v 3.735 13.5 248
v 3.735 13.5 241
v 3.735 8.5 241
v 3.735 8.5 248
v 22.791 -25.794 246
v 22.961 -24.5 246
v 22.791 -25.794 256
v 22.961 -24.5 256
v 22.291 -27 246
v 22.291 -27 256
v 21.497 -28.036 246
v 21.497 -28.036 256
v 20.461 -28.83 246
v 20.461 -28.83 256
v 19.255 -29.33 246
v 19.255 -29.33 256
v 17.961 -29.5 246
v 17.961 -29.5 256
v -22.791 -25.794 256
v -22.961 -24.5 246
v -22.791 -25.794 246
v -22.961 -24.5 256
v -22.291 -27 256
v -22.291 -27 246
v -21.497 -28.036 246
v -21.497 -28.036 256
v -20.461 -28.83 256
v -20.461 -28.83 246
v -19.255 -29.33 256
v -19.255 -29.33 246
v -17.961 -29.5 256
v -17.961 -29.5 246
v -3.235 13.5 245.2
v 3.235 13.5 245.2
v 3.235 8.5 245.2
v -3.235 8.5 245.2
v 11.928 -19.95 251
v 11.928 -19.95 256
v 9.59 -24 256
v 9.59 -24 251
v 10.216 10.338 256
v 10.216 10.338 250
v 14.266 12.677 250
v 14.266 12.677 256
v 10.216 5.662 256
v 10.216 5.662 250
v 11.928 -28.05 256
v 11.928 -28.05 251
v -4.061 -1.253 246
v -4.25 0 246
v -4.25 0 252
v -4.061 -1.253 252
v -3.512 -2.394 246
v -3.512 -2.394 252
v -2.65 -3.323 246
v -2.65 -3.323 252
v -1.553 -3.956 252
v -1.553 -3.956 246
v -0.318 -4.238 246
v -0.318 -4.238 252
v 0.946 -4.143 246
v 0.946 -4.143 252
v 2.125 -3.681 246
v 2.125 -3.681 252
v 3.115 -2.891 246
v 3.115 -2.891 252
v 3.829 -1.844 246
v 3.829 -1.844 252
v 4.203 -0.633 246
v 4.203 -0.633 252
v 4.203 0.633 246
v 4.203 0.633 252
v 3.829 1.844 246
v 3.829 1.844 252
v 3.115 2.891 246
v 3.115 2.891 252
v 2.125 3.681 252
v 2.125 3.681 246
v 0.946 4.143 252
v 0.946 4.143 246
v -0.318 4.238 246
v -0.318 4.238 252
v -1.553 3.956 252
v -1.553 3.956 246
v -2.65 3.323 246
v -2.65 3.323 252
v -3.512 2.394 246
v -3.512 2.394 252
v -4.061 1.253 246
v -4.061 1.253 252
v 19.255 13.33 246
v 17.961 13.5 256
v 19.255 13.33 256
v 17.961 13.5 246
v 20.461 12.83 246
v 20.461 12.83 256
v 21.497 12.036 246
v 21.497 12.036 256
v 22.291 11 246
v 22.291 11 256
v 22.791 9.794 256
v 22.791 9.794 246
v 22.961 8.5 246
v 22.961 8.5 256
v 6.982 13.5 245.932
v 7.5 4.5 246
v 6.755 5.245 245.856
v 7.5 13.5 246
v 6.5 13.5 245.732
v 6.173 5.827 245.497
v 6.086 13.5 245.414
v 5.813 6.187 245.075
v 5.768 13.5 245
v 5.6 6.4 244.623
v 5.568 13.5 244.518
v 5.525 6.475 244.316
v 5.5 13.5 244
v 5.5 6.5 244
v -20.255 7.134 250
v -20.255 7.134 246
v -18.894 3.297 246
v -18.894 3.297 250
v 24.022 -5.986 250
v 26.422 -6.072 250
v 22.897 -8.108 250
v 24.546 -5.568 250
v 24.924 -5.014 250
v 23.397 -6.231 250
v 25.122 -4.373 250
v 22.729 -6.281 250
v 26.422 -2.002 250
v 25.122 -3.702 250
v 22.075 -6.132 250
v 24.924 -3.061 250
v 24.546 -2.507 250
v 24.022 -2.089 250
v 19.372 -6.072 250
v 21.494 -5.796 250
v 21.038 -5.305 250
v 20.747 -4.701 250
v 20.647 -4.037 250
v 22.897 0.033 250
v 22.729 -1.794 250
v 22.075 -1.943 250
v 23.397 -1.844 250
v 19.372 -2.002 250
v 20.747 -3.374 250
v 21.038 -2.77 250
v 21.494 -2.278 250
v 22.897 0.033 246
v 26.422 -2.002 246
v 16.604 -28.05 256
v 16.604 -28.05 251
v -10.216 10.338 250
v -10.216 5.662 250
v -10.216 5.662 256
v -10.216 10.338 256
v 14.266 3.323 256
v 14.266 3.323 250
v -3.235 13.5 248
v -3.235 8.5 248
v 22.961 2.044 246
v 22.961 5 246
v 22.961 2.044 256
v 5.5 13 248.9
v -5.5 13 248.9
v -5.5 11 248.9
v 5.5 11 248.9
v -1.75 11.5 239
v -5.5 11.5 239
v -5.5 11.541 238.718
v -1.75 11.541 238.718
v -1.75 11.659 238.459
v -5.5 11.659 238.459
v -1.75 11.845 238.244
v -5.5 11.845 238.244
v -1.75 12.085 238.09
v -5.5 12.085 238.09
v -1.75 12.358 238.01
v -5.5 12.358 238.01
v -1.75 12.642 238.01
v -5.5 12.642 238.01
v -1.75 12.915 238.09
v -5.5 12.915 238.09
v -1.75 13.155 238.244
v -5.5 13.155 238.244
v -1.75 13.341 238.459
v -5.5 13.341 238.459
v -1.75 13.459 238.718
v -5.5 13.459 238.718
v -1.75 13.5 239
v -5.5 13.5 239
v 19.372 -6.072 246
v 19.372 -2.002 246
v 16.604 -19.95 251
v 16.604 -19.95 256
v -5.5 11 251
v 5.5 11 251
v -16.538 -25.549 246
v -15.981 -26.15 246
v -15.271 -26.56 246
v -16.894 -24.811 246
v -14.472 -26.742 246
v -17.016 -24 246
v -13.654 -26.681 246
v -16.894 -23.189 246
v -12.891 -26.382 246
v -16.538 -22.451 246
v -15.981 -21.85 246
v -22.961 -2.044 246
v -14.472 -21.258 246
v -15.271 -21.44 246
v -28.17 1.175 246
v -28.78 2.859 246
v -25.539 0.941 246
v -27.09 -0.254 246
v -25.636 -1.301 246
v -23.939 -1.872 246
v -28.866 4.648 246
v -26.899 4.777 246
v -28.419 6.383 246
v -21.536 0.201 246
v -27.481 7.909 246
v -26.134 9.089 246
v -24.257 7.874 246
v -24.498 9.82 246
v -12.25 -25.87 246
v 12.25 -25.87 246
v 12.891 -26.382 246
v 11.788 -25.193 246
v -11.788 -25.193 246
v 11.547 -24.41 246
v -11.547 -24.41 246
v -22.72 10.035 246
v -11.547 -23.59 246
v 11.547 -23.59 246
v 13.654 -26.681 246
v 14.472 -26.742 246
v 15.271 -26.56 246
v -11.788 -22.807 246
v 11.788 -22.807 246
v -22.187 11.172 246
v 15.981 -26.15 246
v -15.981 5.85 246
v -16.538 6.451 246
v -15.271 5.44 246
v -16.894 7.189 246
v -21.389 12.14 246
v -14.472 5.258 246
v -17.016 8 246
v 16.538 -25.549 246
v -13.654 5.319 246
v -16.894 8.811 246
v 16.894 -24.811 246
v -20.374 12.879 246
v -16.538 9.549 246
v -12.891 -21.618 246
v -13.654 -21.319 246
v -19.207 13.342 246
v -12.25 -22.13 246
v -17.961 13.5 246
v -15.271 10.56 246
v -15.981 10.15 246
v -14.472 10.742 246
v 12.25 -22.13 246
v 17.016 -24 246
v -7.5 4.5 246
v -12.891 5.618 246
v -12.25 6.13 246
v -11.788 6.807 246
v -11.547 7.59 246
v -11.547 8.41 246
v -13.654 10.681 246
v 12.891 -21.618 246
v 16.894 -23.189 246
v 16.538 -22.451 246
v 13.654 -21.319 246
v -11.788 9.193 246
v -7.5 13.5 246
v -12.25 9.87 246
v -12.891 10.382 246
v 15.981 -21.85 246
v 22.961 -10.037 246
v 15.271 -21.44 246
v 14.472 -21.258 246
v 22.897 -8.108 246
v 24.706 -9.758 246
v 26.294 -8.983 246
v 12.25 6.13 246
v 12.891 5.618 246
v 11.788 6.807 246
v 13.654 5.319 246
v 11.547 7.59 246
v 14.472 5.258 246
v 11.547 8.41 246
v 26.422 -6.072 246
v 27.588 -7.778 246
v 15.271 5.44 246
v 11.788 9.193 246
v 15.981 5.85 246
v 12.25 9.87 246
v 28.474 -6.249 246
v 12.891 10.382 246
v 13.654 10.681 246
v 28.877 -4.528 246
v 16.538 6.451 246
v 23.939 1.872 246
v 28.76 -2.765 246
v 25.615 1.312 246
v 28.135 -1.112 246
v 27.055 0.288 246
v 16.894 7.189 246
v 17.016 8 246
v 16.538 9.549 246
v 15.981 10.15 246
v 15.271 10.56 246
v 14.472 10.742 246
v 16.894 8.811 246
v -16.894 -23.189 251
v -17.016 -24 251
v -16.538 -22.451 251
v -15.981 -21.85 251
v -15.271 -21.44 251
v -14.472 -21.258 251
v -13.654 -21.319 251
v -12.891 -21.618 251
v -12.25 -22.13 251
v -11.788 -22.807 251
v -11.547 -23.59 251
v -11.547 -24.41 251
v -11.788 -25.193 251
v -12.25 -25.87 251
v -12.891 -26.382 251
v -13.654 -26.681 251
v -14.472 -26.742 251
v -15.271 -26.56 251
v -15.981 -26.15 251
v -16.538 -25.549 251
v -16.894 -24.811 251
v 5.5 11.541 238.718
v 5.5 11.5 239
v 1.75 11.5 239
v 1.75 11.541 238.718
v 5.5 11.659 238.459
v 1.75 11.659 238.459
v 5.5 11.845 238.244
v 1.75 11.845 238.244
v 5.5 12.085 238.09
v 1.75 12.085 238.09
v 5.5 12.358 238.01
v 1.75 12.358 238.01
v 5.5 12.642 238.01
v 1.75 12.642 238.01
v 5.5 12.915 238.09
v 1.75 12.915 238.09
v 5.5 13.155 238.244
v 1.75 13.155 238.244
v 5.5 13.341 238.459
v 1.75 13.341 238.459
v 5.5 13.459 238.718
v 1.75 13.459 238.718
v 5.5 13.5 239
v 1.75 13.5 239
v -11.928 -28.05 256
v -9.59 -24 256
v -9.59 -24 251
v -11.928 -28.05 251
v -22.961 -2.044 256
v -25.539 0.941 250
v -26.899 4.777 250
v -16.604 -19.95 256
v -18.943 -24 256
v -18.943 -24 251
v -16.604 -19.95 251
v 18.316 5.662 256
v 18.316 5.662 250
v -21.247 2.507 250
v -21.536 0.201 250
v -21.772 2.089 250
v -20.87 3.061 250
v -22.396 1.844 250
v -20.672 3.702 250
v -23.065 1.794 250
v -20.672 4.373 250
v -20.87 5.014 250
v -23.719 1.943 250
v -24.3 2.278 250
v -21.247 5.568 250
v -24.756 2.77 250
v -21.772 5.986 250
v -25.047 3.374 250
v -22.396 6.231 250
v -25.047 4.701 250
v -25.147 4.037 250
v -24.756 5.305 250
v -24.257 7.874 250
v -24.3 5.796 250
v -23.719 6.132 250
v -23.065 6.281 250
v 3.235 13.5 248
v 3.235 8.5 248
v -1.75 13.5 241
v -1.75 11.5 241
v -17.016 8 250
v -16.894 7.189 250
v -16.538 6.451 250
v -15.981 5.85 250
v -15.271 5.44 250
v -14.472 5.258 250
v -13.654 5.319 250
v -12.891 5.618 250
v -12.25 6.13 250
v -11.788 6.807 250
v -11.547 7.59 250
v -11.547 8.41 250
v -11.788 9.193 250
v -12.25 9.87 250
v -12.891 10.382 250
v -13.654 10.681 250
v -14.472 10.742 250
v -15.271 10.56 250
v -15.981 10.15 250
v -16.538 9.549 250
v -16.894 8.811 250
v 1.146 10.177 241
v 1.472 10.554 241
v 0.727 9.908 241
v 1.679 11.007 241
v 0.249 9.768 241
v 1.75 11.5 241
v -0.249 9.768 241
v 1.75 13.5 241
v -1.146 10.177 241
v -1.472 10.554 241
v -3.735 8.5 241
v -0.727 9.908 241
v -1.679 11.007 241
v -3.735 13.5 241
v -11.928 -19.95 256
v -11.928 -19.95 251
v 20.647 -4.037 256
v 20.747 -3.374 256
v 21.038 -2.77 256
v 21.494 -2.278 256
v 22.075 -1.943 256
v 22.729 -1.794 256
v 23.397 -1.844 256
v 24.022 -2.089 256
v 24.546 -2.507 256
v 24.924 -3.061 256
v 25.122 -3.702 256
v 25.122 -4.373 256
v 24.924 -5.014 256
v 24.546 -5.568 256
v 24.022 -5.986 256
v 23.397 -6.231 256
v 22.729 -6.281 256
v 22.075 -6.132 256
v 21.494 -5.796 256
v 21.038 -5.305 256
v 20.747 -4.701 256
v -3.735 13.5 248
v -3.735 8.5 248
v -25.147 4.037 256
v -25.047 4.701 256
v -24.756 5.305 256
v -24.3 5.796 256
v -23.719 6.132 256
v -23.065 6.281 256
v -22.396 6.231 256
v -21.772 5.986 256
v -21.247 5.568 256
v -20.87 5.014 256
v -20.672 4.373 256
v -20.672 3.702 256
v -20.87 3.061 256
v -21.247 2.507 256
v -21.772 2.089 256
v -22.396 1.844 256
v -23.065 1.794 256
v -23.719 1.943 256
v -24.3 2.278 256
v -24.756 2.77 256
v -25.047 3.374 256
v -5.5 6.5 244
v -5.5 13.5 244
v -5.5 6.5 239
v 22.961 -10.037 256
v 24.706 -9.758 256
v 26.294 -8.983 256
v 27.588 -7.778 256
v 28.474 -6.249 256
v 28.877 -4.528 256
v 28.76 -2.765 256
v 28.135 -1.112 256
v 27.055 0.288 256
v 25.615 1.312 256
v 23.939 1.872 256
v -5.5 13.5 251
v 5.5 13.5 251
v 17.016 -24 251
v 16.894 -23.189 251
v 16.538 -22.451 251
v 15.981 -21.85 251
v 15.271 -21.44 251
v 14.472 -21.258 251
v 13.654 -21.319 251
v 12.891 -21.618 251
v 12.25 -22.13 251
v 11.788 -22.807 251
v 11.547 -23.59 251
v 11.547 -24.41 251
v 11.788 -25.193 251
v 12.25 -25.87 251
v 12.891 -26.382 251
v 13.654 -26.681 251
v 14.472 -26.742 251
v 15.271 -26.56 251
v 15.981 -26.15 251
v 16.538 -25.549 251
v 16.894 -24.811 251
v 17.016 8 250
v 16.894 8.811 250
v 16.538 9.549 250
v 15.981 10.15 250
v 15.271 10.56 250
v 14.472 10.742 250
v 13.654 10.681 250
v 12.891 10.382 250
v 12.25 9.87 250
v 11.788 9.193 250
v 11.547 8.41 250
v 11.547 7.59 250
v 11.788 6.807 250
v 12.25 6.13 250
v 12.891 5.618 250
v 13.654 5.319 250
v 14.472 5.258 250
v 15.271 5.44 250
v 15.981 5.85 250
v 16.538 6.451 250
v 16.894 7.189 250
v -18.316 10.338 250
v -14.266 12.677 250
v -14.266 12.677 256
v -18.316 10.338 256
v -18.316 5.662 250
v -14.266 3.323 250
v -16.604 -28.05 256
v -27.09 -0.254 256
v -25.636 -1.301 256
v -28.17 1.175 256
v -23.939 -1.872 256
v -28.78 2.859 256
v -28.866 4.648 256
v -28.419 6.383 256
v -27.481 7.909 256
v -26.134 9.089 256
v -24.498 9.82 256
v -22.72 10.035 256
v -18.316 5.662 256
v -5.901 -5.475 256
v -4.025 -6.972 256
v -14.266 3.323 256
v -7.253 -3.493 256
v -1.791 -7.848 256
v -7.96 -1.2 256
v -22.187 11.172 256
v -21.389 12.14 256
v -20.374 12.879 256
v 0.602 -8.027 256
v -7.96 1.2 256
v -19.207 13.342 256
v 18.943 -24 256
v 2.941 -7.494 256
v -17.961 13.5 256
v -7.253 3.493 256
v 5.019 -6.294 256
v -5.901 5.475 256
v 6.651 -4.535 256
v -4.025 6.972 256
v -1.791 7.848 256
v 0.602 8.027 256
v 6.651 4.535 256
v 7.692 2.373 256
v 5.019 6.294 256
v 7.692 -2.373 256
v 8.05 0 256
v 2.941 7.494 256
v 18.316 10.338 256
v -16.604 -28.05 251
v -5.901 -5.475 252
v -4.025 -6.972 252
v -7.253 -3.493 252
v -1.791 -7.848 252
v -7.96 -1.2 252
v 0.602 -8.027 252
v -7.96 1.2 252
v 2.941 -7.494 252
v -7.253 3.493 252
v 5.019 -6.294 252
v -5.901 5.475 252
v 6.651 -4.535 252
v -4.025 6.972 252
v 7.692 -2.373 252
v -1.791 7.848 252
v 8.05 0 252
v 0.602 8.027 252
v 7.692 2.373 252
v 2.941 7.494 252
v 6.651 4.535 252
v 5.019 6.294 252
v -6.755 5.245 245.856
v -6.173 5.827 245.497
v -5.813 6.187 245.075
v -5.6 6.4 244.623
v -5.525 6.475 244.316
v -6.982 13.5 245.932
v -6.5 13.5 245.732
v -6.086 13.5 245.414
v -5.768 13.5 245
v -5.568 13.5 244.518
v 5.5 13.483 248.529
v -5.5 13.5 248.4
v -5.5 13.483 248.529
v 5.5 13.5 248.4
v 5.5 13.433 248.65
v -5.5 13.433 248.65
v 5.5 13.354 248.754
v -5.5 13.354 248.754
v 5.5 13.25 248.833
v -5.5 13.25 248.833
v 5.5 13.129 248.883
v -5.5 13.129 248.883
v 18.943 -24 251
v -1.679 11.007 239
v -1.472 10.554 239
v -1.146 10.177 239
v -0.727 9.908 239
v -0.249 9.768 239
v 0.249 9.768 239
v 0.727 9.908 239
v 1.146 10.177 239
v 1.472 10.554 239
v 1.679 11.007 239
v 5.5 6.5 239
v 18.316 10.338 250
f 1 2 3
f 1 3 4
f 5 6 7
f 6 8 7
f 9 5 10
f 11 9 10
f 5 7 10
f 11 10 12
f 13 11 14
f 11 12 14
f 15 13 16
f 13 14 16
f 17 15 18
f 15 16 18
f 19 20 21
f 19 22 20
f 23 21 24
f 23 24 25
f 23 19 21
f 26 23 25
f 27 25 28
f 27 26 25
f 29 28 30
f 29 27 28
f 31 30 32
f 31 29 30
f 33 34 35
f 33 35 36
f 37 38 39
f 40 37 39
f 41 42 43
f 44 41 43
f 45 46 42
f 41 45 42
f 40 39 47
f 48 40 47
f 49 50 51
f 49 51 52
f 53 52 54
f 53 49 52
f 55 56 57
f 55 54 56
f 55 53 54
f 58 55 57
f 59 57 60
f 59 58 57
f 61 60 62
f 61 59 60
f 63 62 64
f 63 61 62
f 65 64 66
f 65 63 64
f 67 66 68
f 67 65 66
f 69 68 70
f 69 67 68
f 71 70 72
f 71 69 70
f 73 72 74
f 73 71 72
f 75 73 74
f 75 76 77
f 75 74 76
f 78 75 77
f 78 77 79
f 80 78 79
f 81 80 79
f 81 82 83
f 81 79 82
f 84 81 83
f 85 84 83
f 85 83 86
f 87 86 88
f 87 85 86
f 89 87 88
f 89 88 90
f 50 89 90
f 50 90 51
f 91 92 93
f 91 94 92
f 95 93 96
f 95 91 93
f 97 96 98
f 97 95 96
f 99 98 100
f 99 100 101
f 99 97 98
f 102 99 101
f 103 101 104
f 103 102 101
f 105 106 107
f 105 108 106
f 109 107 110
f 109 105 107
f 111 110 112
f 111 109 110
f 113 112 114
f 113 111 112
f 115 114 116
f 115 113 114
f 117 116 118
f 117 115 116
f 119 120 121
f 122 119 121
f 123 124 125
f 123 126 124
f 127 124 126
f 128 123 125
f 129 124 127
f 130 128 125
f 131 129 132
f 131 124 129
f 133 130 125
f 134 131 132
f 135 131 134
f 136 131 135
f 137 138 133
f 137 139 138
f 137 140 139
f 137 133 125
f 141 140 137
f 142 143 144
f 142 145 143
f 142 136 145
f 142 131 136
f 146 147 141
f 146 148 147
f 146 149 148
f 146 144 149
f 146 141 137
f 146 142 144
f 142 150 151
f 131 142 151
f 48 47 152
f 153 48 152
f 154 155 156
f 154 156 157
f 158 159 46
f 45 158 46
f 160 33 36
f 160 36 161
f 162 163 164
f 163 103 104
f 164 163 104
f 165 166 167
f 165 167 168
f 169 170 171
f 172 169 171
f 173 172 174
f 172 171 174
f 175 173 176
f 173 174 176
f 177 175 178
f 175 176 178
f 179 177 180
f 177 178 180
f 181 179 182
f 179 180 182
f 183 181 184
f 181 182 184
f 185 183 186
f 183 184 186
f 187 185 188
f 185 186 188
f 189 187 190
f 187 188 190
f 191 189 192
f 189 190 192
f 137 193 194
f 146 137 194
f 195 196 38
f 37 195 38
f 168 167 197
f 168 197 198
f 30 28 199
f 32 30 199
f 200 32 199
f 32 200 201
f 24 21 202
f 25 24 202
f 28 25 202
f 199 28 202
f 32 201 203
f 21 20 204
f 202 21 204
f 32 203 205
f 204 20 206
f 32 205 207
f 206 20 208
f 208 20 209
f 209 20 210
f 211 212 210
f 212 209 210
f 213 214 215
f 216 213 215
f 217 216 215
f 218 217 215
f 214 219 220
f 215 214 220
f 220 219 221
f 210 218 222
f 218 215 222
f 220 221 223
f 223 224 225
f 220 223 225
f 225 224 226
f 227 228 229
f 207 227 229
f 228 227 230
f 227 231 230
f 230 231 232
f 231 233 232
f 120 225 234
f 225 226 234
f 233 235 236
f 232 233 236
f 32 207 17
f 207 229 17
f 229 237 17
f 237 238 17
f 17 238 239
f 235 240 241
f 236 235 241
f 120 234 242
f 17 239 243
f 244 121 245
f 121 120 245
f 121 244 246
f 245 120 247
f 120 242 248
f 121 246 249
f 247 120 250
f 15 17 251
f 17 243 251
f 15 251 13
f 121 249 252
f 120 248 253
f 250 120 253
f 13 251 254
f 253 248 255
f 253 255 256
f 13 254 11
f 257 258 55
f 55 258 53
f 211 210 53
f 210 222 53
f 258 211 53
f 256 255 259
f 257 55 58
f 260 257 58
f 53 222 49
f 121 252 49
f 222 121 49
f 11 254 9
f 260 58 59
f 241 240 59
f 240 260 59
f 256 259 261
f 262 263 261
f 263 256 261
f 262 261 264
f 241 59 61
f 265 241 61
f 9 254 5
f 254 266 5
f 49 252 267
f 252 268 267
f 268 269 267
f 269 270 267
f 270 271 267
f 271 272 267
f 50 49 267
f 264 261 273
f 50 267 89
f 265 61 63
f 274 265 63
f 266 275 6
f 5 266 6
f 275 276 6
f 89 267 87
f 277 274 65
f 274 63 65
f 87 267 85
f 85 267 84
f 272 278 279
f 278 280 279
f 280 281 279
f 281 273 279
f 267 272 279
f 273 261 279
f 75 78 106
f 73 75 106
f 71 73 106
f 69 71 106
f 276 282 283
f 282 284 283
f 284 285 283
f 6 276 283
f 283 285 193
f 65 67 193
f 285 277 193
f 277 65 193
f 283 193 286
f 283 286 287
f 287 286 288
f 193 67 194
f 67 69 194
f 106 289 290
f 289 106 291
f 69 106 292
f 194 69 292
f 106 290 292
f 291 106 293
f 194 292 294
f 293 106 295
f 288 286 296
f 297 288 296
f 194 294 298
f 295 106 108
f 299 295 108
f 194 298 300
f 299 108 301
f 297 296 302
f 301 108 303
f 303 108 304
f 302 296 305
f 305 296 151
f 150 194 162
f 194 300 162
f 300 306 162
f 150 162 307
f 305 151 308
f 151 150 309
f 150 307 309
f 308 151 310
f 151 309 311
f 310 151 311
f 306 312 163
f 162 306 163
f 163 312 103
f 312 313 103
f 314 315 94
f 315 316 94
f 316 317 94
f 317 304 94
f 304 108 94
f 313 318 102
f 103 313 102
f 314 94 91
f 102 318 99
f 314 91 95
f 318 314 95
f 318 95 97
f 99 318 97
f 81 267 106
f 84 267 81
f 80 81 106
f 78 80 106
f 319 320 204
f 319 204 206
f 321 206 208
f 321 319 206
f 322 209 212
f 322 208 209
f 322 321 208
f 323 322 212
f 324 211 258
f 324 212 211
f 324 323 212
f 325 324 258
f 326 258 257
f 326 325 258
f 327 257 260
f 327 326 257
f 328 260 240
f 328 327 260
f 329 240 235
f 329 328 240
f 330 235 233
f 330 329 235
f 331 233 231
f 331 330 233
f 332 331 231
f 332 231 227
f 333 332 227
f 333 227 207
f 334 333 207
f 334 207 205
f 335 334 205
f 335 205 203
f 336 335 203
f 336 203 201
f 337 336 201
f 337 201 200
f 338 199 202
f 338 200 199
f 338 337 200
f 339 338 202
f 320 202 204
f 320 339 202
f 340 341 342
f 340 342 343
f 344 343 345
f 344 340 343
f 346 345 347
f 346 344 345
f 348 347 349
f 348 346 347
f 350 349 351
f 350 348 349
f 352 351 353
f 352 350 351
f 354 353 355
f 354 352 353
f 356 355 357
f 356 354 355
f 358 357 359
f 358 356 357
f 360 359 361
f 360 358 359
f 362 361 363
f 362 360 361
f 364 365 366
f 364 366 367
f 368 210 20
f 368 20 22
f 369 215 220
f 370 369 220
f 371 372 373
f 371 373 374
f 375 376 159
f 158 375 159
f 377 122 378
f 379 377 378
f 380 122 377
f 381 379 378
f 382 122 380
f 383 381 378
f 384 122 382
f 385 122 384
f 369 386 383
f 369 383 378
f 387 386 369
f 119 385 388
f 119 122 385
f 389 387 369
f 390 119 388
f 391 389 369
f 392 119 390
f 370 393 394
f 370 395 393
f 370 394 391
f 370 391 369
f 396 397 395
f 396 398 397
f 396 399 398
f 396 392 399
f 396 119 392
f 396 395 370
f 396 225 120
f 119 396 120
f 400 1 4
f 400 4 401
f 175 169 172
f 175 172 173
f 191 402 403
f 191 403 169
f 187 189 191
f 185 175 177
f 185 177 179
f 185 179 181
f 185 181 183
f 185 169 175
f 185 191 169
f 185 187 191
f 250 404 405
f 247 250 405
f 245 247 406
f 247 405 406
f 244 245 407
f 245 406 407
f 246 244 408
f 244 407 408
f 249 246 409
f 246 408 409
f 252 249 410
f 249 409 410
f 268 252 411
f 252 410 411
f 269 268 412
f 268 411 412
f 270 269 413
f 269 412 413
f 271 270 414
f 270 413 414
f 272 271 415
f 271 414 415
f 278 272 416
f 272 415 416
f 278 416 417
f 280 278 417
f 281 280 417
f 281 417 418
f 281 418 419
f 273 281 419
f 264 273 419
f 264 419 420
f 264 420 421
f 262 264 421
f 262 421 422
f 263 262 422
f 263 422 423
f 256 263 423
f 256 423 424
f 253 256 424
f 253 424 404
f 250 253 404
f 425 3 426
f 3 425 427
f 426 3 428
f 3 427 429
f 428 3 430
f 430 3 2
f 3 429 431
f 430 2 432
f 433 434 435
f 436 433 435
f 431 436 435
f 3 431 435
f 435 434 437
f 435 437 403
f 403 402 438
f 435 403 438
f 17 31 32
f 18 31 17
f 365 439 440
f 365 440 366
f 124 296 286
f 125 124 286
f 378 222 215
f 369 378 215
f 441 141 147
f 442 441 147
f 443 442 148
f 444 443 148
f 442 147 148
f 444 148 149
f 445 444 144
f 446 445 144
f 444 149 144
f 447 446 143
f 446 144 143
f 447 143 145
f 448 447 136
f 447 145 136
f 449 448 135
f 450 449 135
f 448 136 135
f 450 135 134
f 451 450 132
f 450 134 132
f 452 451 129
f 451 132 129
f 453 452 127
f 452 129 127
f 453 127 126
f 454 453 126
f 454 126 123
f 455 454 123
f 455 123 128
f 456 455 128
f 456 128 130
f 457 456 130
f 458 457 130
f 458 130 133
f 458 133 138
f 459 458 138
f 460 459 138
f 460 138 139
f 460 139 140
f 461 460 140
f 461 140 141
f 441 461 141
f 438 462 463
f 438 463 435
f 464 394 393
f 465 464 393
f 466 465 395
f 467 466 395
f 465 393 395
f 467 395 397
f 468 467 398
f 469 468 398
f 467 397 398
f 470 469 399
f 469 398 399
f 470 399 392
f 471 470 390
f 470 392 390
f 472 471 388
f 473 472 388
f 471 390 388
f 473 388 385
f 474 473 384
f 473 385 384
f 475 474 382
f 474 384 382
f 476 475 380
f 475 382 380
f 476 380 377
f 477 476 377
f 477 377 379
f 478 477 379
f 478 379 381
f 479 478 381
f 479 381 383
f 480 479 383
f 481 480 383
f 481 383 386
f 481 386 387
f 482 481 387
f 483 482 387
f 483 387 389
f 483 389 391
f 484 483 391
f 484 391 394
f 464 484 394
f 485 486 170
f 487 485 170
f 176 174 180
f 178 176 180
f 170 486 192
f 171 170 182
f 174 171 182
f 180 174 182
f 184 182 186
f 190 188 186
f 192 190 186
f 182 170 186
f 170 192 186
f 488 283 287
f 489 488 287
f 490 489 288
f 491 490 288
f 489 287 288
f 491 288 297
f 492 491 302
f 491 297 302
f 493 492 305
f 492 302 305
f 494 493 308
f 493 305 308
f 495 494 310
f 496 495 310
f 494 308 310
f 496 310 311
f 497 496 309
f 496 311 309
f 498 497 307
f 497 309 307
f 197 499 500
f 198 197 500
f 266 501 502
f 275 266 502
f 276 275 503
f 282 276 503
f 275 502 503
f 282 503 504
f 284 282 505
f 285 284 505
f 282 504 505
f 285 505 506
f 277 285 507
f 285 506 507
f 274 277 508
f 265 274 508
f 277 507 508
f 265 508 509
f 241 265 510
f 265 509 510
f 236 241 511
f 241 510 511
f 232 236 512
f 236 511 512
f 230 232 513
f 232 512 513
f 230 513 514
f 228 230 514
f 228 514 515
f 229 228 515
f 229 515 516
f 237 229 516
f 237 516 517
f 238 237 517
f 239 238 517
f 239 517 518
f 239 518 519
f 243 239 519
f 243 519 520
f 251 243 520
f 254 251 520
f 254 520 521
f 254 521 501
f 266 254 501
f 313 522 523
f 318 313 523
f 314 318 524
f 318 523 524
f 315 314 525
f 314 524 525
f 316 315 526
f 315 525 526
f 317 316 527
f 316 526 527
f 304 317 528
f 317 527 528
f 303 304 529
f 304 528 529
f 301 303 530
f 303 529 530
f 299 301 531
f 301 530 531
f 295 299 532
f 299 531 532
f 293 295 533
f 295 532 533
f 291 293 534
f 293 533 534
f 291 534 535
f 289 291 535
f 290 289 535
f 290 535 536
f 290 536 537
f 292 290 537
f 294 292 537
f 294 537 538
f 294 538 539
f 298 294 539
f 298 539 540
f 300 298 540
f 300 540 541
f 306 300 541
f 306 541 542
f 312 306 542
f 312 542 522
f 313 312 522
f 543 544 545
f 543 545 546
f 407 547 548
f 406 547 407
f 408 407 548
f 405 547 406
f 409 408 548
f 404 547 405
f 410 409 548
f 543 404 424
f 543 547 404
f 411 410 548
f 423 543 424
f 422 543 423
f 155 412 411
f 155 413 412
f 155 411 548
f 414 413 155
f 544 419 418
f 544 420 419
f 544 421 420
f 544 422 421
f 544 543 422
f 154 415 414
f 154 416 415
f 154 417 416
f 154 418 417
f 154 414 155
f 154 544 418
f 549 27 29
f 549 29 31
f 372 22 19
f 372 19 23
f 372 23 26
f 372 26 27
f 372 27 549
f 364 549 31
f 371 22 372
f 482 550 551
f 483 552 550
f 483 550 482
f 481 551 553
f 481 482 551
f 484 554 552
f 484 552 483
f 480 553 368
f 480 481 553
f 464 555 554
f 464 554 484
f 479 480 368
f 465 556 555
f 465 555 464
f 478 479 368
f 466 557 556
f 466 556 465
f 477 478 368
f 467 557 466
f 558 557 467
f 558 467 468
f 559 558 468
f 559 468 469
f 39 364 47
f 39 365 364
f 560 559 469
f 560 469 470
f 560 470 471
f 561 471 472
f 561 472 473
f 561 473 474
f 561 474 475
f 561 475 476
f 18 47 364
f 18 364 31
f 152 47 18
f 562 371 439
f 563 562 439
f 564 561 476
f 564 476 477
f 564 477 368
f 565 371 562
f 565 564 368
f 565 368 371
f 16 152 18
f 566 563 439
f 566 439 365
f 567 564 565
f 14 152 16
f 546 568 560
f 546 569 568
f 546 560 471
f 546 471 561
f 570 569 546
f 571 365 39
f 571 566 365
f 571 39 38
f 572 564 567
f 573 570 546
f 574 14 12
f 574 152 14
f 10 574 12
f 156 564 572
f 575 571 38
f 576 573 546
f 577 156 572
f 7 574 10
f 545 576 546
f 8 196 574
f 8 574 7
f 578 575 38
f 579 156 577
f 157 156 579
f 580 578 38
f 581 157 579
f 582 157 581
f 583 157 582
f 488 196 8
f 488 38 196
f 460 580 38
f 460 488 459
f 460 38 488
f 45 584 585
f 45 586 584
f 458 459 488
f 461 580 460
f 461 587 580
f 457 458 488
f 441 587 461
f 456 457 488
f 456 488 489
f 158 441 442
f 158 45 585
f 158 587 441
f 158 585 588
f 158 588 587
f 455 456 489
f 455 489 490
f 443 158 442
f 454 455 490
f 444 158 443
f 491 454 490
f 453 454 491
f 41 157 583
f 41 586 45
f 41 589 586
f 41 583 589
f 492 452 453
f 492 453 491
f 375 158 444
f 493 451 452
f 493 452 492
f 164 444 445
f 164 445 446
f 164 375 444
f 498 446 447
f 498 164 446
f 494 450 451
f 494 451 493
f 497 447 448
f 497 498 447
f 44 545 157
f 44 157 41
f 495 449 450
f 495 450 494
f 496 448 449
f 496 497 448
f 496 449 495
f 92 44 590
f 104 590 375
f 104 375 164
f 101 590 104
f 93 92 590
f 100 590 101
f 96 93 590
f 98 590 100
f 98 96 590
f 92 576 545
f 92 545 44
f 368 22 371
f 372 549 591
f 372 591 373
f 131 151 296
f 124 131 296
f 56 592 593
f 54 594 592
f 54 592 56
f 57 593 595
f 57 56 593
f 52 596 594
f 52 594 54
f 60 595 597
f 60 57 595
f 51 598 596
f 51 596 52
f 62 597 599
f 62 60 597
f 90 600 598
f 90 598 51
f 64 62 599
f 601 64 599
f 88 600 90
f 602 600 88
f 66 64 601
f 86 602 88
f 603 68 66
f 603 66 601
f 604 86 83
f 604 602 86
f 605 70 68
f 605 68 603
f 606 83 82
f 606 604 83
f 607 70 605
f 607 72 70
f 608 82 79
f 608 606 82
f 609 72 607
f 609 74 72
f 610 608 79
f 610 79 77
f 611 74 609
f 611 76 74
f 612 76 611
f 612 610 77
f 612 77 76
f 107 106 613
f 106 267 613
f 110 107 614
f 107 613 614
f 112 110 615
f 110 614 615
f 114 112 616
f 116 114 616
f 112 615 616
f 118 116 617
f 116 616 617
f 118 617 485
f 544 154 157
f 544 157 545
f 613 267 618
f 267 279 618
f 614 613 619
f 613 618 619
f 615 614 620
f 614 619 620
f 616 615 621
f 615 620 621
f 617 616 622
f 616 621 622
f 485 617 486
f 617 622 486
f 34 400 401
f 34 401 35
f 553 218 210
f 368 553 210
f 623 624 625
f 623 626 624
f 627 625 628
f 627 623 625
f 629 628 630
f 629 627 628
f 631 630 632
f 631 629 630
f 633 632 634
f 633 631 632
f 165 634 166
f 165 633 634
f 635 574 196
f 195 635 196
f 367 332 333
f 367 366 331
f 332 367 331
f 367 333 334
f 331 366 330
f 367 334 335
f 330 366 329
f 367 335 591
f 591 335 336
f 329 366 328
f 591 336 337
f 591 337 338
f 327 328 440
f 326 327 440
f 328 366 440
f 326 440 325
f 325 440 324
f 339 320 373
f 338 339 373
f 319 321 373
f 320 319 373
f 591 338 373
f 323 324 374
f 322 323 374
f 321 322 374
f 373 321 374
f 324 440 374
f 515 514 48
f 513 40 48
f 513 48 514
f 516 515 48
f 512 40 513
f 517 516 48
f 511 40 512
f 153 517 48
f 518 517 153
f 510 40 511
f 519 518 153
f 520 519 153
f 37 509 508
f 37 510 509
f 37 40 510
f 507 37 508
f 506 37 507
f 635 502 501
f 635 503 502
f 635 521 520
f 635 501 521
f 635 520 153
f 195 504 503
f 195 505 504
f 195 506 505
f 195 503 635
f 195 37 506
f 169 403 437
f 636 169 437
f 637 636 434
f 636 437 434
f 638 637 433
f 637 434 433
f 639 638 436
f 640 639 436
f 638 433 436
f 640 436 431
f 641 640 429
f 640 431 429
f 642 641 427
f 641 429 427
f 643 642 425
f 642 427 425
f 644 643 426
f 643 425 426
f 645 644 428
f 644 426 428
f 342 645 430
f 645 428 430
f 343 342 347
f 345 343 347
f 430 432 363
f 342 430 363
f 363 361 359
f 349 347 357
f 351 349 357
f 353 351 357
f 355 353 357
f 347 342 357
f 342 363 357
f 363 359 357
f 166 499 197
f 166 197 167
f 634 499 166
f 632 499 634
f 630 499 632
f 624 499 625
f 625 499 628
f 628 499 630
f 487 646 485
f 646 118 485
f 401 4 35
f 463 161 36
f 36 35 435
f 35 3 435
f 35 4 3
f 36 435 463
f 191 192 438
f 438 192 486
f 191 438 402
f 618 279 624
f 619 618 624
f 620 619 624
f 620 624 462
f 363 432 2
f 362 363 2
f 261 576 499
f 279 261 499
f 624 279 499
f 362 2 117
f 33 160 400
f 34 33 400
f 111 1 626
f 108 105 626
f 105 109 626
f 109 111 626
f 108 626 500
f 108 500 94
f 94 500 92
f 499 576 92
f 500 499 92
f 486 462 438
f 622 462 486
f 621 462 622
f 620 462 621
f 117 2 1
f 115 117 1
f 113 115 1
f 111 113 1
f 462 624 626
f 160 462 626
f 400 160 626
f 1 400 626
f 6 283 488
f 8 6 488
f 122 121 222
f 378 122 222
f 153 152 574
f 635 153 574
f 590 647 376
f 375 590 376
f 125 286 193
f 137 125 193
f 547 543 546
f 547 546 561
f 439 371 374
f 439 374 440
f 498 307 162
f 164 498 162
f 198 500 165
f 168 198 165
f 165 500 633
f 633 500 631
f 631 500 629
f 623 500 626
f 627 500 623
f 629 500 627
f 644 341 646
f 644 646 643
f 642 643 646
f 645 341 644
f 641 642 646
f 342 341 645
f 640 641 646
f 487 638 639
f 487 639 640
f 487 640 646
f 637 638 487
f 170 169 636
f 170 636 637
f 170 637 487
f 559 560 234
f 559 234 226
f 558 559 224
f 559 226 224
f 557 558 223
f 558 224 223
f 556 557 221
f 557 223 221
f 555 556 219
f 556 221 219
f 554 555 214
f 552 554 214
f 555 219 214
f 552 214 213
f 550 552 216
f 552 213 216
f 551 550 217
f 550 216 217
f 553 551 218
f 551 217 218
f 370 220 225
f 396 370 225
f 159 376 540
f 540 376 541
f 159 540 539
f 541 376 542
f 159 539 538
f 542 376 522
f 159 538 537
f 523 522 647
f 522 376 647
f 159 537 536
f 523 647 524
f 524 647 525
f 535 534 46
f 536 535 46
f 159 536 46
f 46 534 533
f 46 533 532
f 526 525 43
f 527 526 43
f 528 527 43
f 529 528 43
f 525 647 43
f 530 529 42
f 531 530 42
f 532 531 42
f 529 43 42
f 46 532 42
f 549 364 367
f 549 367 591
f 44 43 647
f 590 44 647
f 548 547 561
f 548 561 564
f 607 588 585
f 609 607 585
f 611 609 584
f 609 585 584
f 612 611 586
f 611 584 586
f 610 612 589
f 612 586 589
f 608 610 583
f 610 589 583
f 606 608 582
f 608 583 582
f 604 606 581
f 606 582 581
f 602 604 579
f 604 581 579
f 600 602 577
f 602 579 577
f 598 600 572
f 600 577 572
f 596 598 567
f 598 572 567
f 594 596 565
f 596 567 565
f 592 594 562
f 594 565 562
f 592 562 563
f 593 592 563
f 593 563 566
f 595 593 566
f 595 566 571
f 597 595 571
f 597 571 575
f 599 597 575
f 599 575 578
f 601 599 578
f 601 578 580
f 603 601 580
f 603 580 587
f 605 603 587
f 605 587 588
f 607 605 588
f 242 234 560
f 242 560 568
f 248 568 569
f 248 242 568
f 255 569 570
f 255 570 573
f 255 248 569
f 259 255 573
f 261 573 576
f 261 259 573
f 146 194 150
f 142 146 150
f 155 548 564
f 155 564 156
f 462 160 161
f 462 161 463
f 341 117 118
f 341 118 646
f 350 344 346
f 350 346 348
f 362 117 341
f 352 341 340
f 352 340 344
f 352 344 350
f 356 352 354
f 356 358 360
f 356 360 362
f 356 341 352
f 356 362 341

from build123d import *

# Parameters (mm, degrees)
BOSS_EXTRUDE1_DEPTH      = 13.5
BOSS_EXTRUDE2_DEPTH      = 18.5
BOSS_EXTRUDE3_DEPTH      = 5
SKETCH4_W                = 45.922011884
SKETCH4_H                = 20
BOSS_EXTRUDE4_DEPTH      = 13.5
SKETCH2_R                = 4.25
CUT_EXTRUDE1_DEPTH       = 268.629329099
SKETCH6_R                = 8.05
CUT_EXTRUDE3_DEPTH       = 14
BOSS_EXTRUDE5_DEPTH      = 13.5
CUT_EXTRUDE5_REACH       = 210.1
CUT_EXTRUDE5_END_RADIUS  = 45
SKETCH8_R                = 9
CUT_EXTRUDE6_REACH       = 210.1
SKETCH10_R               = 4
SKETCH11_R               = 8
CUT_EXTRUDE7_DEPTH       = 4
SKETCH18_R               = 11
CUT_EXTRUDE9_DEPTH       = 47
CUT_EXTRUDE11_DEPTH      = 268.629329099
CUT_EXTRUDE11_DEPTH_BACK = 268.629329099
SKETCH20_W               = 45.922011884
SKETCH20_H               = 204.425421037
SKETCH21_W               = 45.922011884
SKETCH21_H               = 10
BOSS_EXTRUDE6_DEPTH      = 16
M5_CLEARANCE_HOLE1_D     = 5.5
CUT_EXTRUDE12_DEPTH      = 5
LPATTERN2_COUNT          = 2
LPATTERN2_PITCH          = 32
LPATTERN2_COPY_1_D       = 5.5
CUT_EXTRUDE13_START      = -4
SKETCH25_R               = 2.75
CUT_EXTRUDE13_DEPTH      = 39.396436099
SKETCH26_W               = 45.922011884
SKETCH26_H               = 10
CUT_EXTRUDE14_DEPTH      = 271.429672547
FILLET1_R                = 5
SKETCH30_W               = 11
SKETCH30_H               = 7
BOSS_EXTRUDE8_DEPTH      = 5
CUT_EXTRUDE15_DEPTH      = 5
FILLET3_R                = 2
BOSS_EXTRUDE9_DEPTH      = 2
BOSS_EXTRUDE10_DEPTH     = 3.75
SKETCH36_W               = 11
SKETCH36_H               = 2.1
CUT_EXTRUDE17_DEPTH      = 2.5
FILLET4_R                = 0.5
BOSS_EXTRUDE11_START     = -10
BOSS_EXTRUDE11_DEPTH     = 10
CUT_EXTRUDE18_DEPTH      = 4
M4_CLEARANCE_HOLE1_D     = 4.5


with BuildPart() as part:
    # Sketch1 → Boss-Extrude1 (new, symmetric)
    with BuildSketch(Plane(origin=(0, 0, 0), x_dir=(1, 0, 0), z_dir=(0, 1, 0))):
        with BuildLine():
            ThreePointArc((17.220754456, -41.574578963), (0, -45), (-17.220754456, -41.574578963))
            Line((-17.220754456, -41.574578963), (-22.961005942, -55.432771951))
            ThreePointArc((-22.961005942, -55.432771951), (0, -60), (22.961005942, -55.432771951))
            Line((22.961005942, -55.432771951), (17.220754456, -41.574578963))
        make_face()
    extrude(amount=BOSS_EXTRUDE1_DEPTH, both=True)

    # Sketch1<3> → Boss-Extrude2 (add, symmetric)
    with BuildSketch(Plane(origin=(0, 0, 0), x_dir=(1, 0, 0), z_dir=(0, 1, 0))):
        with BuildLine():
            ThreePointArc((19.134171618, -46.193976626), (0, -50), (-19.134171618, -46.193976626))
            Line((-19.134171618, -46.193976626), (-21.04758878, -50.813374288))
            ThreePointArc((-21.04758878, -50.813374288), (0, -55), (21.04758878, -50.813374288))
            Line((21.04758878, -50.813374288), (19.134171618, -46.193976626))
        make_face()
    extrude(amount=BOSS_EXTRUDE2_DEPTH, both=True)

    # Sketch3 → Boss-Extrude3 (add, symmetric)
    with BuildSketch(Plane.XZ):
        with BuildLine():
            Line((-22.961005942, 266), (-22.961005942, 55.432771951))
            ThreePointArc((-22.961005942, 55.432771951), (-20.481139434, 56.39612511), (-17.961005942, 57.248600555))
            Line((-17.961005942, 57.248600555), (-17.961005942, 246))
            Line((-17.961005942, 246), (17.961005942, 246))
            Line((17.961005942, 246), (17.961005942, 57.248600555))
            ThreePointArc((17.961005942, 57.248600555), (20.481139434, 56.39612511), (22.961005942, 55.432771951))
            Line((22.961005942, 55.432771951), (22.961005942, 266))
            Line((22.961005942, 266), (-22.961005942, 266))
        make_face()
    extrude(amount=BOSS_EXTRUDE3_DEPTH, both=True)

    # Sketch4 → Boss-Extrude4 (add, symmetric)
    with BuildSketch(Plane(origin=(0, 0, 0), x_dir=(1, 0, 0), z_dir=(0, 1, 0))):
        with Locations((0, -256)):
            Rectangle(SKETCH4_W, SKETCH4_H)
    extrude(amount=BOSS_EXTRUDE4_DEPTH, both=True)

    # Sketch2 → Cut-Extrude1 (cut, through all)
    with BuildSketch(Plane.XY):
        with Locations(Location((0, 0, 0), (0, 0, 180))):
            Circle(SKETCH2_R)
    extrude(amount=CUT_EXTRUDE1_DEPTH, mode=Mode.SUBTRACT)

    # Sketch6 → Cut-Extrude3 (cut)
    with BuildSketch(Plane.XY.offset(266)):
        Circle(SKETCH6_R)
    extrude(amount=-CUT_EXTRUDE3_DEPTH, mode=Mode.SUBTRACT)

    # Sketch9 → Boss-Extrude5 (add, symmetric)
    with BuildSketch(Plane(origin=(0, 0, 0), x_dir=(1, 0, 0), z_dir=(0, 1, 0))):
        with BuildLine():
            Line((-22.961005942, -55.432771951), (-22.961005942, -68))
            Line((-22.961005942, -68), (22.961005942, -68))
            Line((22.961005942, -68), (22.961005942, -55.432771951))
            ThreePointArc((22.961005942, -55.432771951), (0, -60), (-22.961005942, -55.432771951))
        make_face()
    extrude(amount=BOSS_EXTRUDE5_DEPTH, both=True)

    # Cut-Extrude5: up to this cylinder (the profile starts outside it)
    cut_extrude5_end = Plane(origin=(0, 0, 0), z_dir=(0, -1, 0)) * Cylinder(CUT_EXTRUDE5_END_RADIUS, 511.2, mode=Mode.PRIVATE)
    # Sketch8 → Cut-Extrude5 (cut, up to the surface)
    with BuildSketch(Plane.XY.offset(60), mode=Mode.PRIVATE) as cut_extrude5_sk1:
        Circle(SKETCH8_R)
    cut_extrude5_tool1 = extrude(cut_extrude5_sk1.sketch, amount=-CUT_EXTRUDE5_REACH, mode=Mode.PRIVATE) - cut_extrude5_end
    add(cut_extrude5_tool1.solids().sort_by_distance((0, 0, 60))[0], mode=Mode.SUBTRACT)

    # Sketch10 → Cut-Extrude6 (cut, up to next)
    with BuildSketch(Plane.XY.offset(60), mode=Mode.PRIVATE) as cut_extrude6_sk1:
        with Locations(Location((0, 0, 0), (0, 0, 180))):
            Circle(SKETCH10_R)
    cut_extrude6_tool1 = extrude(cut_extrude6_sk1.sketch, amount=CUT_EXTRUDE6_REACH, mode=Mode.PRIVATE) & part.part
    add(cut_extrude6_tool1.solids().sort_by_distance((0, 0, 60))[0], mode=Mode.SUBTRACT)

    # Sketch11 → Cut-Extrude7 (cut)
    with BuildSketch(Plane.XY.offset(68)):
        Circle(SKETCH11_R)
    extrude(amount=-CUT_EXTRUDE7_DEPTH, mode=Mode.SUBTRACT)

    # Sketch18 → Cut-Extrude9 (cut)
    with BuildSketch(Plane.XY):
        with Locations(Location((0, 0, 0), (0, 0, 180))):
            Circle(SKETCH18_R)
    extrude(amount=CUT_EXTRUDE9_DEPTH, mode=Mode.SUBTRACT)

    # Sketch20 → Cut-Extrude11 (cut, two sides: drawn at the far end of the back side and taken through both)
    with BuildSketch(Plane(origin=(0, 0, 0), x_dir=(1, 0, 0), z_dir=(0, 1, 0)).offset(-CUT_EXTRUDE11_DEPTH_BACK)):
        with Locations((0, -143.787289482)):
            Rectangle(SKETCH20_W, SKETCH20_H)
    extrude(amount=CUT_EXTRUDE11_DEPTH + CUT_EXTRUDE11_DEPTH_BACK, mode=Mode.SUBTRACT)

    # Sketch21 → Boss-Extrude6 (add)
    with BuildSketch(Plane.XZ.offset(13.5)):
        with Locations((0, 251)):
            Rectangle(SKETCH21_W, SKETCH21_H)
    extrude(amount=BOSS_EXTRUDE6_DEPTH)

    # M5 Clearance Hole1 (through all)
    with Locations(Plane(origin=(0, 0, 246), x_dir=(-1, 0, 0), z_dir=(0, 0, -1))):
        with Locations((-14.26606865, -24)):
            m5_clearance_hole1 = Hole(M5_CLEARANCE_HOLE1_D / 2)

    # Sketch24 → Cut-Extrude12 (cut)
    with BuildSketch(Plane.XY.offset(256)):
        Polygon((18.94260583, -24), (16.60433724, -19.95), (11.92780006, -19.95), (9.58953147, -24), (11.92780006, -28.05), (16.60433724, -28.05), align=None)
    cut_extrude12 = extrude(amount=-CUT_EXTRUDE12_DEPTH, mode=Mode.SUBTRACT)

    # Mirror1: M5 Clearance Hole1 across plane
    add(m5_clearance_hole1.mirror(Plane(origin=(0, 0, 0), x_dir=(0, 0, 1), z_dir=(1, 0, 0))), mode=Mode.SUBTRACT)

    # Mirror2: Cut-Extrude12 across plane
    add(cut_extrude12.mirror(Plane(origin=(0, 0, 0), x_dir=(0, 0, 1), z_dir=(1, 0, 0))), mode=Mode.SUBTRACT)

    # LPattern2: M5 Clearance Hole1 ×2
    with Locations(*[(0, i * LPATTERN2_PITCH, 0) for i in range(1, LPATTERN2_COUNT)]):
        add(m5_clearance_hole1, mode=Mode.SUBTRACT)

    # LPattern2 copy 1 (through all)
    with Locations(Plane(origin=(0, 32, 246), x_dir=(1, 0, 0), z_dir=(0, 0, -1))):
        with Locations((-14.26606865, 24)):
            Hole(LPATTERN2_COPY_1_D / 2)

    # Sketch25 → Cut-Extrude13 (cut, through all)
    # profile 1 of 2: a face of its own
    with BuildSketch(Plane(origin=(0, 0, 246), x_dir=(-1, 0, 0), z_dir=(0, 0, -1)).offset(CUT_EXTRUDE13_START)):
        Polygon((-10.21606865, 10.33826859), (-14.26606865, 12.67653718), (-18.31606865, 10.33826859), (-18.31606865, 5.66173141), (-14.26606865, 3.32346282), (-10.21606865, 5.66173141), align=None)
        with Locations((-14.26606865, 8)):
            Circle(SKETCH25_R, mode=Mode.SUBTRACT)
    # profile 2 of 2: a face of its own
    with BuildSketch(Plane(origin=(0, 0, 246), x_dir=(-1, 0, 0), z_dir=(0, 0, -1)).offset(CUT_EXTRUDE13_START)):
        with Locations((-14.26606865, 8)):
            Circle(SKETCH25_R)
    cut_extrude13 = extrude(amount=-CUT_EXTRUDE13_DEPTH, mode=Mode.SUBTRACT)

    # Mirror3: Cut-Extrude13 across plane
    add(cut_extrude13.mirror(Plane(origin=(0, 0, 0), x_dir=(0, 0, 1), z_dir=(1, 0, 0))), mode=Mode.SUBTRACT)

    # Sketch26 → Cut-Extrude14 (cut, through all)
    with BuildSketch(Plane(origin=(0, 13.5, 0), x_dir=(1, 0, 0), z_dir=(0, 1, 0))):
        with Locations((0, -261)):
            Rectangle(SKETCH26_W, SKETCH26_H)
    extrude(amount=-CUT_EXTRUDE14_DEPTH, mode=Mode.SUBTRACT)

    # Fillet1
    fillet1_edges = [part.edges().sort_by_distance(p)[0] for p in [
        (-22.961005942, -29.5, 251),
        (22.961005942, -29.5, 251),
        (22.961005942, 13.5, 251),
        (-22.961005942, 13.5, 251),
    ]]
    fillet(fillet1_edges, radius=FILLET1_R)

    # Sketch30 → Boss-Extrude8 (add)
    with BuildSketch(Plane(origin=(0, 0, 246), x_dir=(-1, 0, 0), z_dir=(0, 0, -1))):
        with Locations((0, 10)):
            Rectangle(SKETCH30_W, SKETCH30_H)
    extrude(amount=BOSS_EXTRUDE8_DEPTH)

    # Sketch31 → Cut-Extrude15 (cut)
    with BuildSketch(Plane(origin=(0, 13.5, 0), x_dir=(1, 0, 0), z_dir=(0, 1, 0))):
        Polygon((3.735, -241), (3.735, -248), (3.235, -248), (3.235, -245.2), (-3.235, -245.2), (-3.235, -248), (-3.735, -248), (-3.735, -241), align=None)
    extrude(amount=-CUT_EXTRUDE15_DEPTH, mode=Mode.SUBTRACT)

    # Fillet3
    fillet3_edges = [part.edges().sort_by_distance(p)[0] for p in [
        (-5.5, 10, 246),
        (5.5, 10, 246),
        (0, 6.5, 246),
    ]]
    fillet(fillet3_edges, radius=FILLET3_R)

    # Sketch32 → Boss-Extrude9 (add)
    with BuildSketch(Plane(origin=(0, 0, 241), x_dir=(-1, 0, 0), z_dir=(0, 0, -1))):
        Polygon((3.735, 13.5), (3.735, 8.5), (-3.735, 8.5), (-3.735, 13.5), (-5.5, 13.5), (-5.5, 6.5), (5.5, 6.5), (5.5, 13.5), align=None)
        with BuildLine():
            ThreePointArc((1.75, 11.5), (0, 9.75), (-1.75, 11.5))
            Line((-1.75, 11.5), (-1.75, 13.5))
            Line((-1.75, 13.5), (-3.735, 13.5))
            Line((-3.735, 13.5), (-3.735, 8.5))
            Line((-3.735, 8.5), (3.735, 8.5))
            Line((3.735, 8.5), (3.735, 13.5))
            Line((3.735, 13.5), (1.75, 13.5))
            Line((1.75, 13.5), (1.75, 11.5))
        make_face()
    extrude(amount=BOSS_EXTRUDE9_DEPTH)

    # Sketch34 → Boss-Extrude10 (add)
    with BuildSketch(Plane.ZY.offset(5.5)):
        with BuildLine():
            Line((239, 13.5), (239, 11.5))
            ThreePointArc((239, 11.5), (238, 12.5), (239, 13.5))
        make_face()
    boss_extrude10 = extrude(amount=-BOSS_EXTRUDE10_DEPTH)

    # Mirror5: Boss-Extrude10 across plane
    add(boss_extrude10.mirror(Plane(origin=(0, 0, 0), x_dir=(0, 0, 1), z_dir=(1, 0, 0))))

    # Sketch36 → Cut-Extrude17 (cut)
    with BuildSketch(Plane(origin=(0, 13.5, 0), x_dir=(1, 0, 0), z_dir=(0, 1, 0))):
        with Locations((0, -249.95)):
            Rectangle(SKETCH36_W, SKETCH36_H)
    extrude(amount=-CUT_EXTRUDE17_DEPTH, mode=Mode.SUBTRACT)

    # Fillet4
    fillet4_edges = [part.edges().sort_by_distance(p)[0] for p in [
        (0, 13.5, 248.9),
    ]]
    fillet(fillet4_edges, radius=FILLET4_R)

    # Sketch38 → Boss-Extrude11 (add)
    with BuildSketch(Plane.XY.offset(256).offset(BOSS_EXTRUDE11_START)):
        with BuildLine():
            Line((23.938669324, 1.871526387), (22.961005942, 2.04391482))
            Line((22.961005942, 2.04391482), (22.961005942, -10.036976376))
            ThreePointArc((22.961005942, -10.036976376), (28.876661693, -4.528255996), (23.938669324, 1.871526387))
        make_face()
        with BuildLine():
            ThreePointArc((-22.961005942, 8.5), (-22.900298084, 9.276783841), (-22.719648688, 10.034704928))
            ThreePointArc((-22.719648688, 10.034704928), (-28.86557724, 4.648435983), (-23.938669324, -1.871526387))
            Line((-23.938669324, -1.871526387), (-22.961005942, -2.04391482))
            Line((-22.961005942, -2.04391482), (-22.961005942, 8.5))
        make_face()
    extrude(amount=BOSS_EXTRUDE11_DEPTH)

    # Sketch39 → Cut-Extrude18 (cut)
    with BuildSketch(Plane(origin=(0, 0, 246), x_dir=(-1, 0, 0), z_dir=(0, 0, -1))):
        Polygon((-22.896780258, -8.107639529), (-19.371780258, -6.07247983), (-19.371780258, -2.002160432), (-22.896780258, 0.032999267), (-26.421780258, -2.002160432), (-26.421780258, -6.07247983), align=None)
        Polygon((18.894288787, 3.29734579), (21.536371099, 0.201073668), (25.53886257, 0.941048009), (26.899271729, 4.777294471), (24.257189416, 7.873566593), (20.254697945, 7.133592253), align=None)
    extrude(amount=-CUT_EXTRUDE18_DEPTH, mode=Mode.SUBTRACT)

    # M4 Clearance Hole1 (through all)
    with Locations(Plane.XY.offset(256)):
        with Locations((-22.896780258, 4.037320131), (22.896780258, -4.037320131)):
            Hole(M4_CLEARANCE_HOLE1_D / 2)


solid = part.part
